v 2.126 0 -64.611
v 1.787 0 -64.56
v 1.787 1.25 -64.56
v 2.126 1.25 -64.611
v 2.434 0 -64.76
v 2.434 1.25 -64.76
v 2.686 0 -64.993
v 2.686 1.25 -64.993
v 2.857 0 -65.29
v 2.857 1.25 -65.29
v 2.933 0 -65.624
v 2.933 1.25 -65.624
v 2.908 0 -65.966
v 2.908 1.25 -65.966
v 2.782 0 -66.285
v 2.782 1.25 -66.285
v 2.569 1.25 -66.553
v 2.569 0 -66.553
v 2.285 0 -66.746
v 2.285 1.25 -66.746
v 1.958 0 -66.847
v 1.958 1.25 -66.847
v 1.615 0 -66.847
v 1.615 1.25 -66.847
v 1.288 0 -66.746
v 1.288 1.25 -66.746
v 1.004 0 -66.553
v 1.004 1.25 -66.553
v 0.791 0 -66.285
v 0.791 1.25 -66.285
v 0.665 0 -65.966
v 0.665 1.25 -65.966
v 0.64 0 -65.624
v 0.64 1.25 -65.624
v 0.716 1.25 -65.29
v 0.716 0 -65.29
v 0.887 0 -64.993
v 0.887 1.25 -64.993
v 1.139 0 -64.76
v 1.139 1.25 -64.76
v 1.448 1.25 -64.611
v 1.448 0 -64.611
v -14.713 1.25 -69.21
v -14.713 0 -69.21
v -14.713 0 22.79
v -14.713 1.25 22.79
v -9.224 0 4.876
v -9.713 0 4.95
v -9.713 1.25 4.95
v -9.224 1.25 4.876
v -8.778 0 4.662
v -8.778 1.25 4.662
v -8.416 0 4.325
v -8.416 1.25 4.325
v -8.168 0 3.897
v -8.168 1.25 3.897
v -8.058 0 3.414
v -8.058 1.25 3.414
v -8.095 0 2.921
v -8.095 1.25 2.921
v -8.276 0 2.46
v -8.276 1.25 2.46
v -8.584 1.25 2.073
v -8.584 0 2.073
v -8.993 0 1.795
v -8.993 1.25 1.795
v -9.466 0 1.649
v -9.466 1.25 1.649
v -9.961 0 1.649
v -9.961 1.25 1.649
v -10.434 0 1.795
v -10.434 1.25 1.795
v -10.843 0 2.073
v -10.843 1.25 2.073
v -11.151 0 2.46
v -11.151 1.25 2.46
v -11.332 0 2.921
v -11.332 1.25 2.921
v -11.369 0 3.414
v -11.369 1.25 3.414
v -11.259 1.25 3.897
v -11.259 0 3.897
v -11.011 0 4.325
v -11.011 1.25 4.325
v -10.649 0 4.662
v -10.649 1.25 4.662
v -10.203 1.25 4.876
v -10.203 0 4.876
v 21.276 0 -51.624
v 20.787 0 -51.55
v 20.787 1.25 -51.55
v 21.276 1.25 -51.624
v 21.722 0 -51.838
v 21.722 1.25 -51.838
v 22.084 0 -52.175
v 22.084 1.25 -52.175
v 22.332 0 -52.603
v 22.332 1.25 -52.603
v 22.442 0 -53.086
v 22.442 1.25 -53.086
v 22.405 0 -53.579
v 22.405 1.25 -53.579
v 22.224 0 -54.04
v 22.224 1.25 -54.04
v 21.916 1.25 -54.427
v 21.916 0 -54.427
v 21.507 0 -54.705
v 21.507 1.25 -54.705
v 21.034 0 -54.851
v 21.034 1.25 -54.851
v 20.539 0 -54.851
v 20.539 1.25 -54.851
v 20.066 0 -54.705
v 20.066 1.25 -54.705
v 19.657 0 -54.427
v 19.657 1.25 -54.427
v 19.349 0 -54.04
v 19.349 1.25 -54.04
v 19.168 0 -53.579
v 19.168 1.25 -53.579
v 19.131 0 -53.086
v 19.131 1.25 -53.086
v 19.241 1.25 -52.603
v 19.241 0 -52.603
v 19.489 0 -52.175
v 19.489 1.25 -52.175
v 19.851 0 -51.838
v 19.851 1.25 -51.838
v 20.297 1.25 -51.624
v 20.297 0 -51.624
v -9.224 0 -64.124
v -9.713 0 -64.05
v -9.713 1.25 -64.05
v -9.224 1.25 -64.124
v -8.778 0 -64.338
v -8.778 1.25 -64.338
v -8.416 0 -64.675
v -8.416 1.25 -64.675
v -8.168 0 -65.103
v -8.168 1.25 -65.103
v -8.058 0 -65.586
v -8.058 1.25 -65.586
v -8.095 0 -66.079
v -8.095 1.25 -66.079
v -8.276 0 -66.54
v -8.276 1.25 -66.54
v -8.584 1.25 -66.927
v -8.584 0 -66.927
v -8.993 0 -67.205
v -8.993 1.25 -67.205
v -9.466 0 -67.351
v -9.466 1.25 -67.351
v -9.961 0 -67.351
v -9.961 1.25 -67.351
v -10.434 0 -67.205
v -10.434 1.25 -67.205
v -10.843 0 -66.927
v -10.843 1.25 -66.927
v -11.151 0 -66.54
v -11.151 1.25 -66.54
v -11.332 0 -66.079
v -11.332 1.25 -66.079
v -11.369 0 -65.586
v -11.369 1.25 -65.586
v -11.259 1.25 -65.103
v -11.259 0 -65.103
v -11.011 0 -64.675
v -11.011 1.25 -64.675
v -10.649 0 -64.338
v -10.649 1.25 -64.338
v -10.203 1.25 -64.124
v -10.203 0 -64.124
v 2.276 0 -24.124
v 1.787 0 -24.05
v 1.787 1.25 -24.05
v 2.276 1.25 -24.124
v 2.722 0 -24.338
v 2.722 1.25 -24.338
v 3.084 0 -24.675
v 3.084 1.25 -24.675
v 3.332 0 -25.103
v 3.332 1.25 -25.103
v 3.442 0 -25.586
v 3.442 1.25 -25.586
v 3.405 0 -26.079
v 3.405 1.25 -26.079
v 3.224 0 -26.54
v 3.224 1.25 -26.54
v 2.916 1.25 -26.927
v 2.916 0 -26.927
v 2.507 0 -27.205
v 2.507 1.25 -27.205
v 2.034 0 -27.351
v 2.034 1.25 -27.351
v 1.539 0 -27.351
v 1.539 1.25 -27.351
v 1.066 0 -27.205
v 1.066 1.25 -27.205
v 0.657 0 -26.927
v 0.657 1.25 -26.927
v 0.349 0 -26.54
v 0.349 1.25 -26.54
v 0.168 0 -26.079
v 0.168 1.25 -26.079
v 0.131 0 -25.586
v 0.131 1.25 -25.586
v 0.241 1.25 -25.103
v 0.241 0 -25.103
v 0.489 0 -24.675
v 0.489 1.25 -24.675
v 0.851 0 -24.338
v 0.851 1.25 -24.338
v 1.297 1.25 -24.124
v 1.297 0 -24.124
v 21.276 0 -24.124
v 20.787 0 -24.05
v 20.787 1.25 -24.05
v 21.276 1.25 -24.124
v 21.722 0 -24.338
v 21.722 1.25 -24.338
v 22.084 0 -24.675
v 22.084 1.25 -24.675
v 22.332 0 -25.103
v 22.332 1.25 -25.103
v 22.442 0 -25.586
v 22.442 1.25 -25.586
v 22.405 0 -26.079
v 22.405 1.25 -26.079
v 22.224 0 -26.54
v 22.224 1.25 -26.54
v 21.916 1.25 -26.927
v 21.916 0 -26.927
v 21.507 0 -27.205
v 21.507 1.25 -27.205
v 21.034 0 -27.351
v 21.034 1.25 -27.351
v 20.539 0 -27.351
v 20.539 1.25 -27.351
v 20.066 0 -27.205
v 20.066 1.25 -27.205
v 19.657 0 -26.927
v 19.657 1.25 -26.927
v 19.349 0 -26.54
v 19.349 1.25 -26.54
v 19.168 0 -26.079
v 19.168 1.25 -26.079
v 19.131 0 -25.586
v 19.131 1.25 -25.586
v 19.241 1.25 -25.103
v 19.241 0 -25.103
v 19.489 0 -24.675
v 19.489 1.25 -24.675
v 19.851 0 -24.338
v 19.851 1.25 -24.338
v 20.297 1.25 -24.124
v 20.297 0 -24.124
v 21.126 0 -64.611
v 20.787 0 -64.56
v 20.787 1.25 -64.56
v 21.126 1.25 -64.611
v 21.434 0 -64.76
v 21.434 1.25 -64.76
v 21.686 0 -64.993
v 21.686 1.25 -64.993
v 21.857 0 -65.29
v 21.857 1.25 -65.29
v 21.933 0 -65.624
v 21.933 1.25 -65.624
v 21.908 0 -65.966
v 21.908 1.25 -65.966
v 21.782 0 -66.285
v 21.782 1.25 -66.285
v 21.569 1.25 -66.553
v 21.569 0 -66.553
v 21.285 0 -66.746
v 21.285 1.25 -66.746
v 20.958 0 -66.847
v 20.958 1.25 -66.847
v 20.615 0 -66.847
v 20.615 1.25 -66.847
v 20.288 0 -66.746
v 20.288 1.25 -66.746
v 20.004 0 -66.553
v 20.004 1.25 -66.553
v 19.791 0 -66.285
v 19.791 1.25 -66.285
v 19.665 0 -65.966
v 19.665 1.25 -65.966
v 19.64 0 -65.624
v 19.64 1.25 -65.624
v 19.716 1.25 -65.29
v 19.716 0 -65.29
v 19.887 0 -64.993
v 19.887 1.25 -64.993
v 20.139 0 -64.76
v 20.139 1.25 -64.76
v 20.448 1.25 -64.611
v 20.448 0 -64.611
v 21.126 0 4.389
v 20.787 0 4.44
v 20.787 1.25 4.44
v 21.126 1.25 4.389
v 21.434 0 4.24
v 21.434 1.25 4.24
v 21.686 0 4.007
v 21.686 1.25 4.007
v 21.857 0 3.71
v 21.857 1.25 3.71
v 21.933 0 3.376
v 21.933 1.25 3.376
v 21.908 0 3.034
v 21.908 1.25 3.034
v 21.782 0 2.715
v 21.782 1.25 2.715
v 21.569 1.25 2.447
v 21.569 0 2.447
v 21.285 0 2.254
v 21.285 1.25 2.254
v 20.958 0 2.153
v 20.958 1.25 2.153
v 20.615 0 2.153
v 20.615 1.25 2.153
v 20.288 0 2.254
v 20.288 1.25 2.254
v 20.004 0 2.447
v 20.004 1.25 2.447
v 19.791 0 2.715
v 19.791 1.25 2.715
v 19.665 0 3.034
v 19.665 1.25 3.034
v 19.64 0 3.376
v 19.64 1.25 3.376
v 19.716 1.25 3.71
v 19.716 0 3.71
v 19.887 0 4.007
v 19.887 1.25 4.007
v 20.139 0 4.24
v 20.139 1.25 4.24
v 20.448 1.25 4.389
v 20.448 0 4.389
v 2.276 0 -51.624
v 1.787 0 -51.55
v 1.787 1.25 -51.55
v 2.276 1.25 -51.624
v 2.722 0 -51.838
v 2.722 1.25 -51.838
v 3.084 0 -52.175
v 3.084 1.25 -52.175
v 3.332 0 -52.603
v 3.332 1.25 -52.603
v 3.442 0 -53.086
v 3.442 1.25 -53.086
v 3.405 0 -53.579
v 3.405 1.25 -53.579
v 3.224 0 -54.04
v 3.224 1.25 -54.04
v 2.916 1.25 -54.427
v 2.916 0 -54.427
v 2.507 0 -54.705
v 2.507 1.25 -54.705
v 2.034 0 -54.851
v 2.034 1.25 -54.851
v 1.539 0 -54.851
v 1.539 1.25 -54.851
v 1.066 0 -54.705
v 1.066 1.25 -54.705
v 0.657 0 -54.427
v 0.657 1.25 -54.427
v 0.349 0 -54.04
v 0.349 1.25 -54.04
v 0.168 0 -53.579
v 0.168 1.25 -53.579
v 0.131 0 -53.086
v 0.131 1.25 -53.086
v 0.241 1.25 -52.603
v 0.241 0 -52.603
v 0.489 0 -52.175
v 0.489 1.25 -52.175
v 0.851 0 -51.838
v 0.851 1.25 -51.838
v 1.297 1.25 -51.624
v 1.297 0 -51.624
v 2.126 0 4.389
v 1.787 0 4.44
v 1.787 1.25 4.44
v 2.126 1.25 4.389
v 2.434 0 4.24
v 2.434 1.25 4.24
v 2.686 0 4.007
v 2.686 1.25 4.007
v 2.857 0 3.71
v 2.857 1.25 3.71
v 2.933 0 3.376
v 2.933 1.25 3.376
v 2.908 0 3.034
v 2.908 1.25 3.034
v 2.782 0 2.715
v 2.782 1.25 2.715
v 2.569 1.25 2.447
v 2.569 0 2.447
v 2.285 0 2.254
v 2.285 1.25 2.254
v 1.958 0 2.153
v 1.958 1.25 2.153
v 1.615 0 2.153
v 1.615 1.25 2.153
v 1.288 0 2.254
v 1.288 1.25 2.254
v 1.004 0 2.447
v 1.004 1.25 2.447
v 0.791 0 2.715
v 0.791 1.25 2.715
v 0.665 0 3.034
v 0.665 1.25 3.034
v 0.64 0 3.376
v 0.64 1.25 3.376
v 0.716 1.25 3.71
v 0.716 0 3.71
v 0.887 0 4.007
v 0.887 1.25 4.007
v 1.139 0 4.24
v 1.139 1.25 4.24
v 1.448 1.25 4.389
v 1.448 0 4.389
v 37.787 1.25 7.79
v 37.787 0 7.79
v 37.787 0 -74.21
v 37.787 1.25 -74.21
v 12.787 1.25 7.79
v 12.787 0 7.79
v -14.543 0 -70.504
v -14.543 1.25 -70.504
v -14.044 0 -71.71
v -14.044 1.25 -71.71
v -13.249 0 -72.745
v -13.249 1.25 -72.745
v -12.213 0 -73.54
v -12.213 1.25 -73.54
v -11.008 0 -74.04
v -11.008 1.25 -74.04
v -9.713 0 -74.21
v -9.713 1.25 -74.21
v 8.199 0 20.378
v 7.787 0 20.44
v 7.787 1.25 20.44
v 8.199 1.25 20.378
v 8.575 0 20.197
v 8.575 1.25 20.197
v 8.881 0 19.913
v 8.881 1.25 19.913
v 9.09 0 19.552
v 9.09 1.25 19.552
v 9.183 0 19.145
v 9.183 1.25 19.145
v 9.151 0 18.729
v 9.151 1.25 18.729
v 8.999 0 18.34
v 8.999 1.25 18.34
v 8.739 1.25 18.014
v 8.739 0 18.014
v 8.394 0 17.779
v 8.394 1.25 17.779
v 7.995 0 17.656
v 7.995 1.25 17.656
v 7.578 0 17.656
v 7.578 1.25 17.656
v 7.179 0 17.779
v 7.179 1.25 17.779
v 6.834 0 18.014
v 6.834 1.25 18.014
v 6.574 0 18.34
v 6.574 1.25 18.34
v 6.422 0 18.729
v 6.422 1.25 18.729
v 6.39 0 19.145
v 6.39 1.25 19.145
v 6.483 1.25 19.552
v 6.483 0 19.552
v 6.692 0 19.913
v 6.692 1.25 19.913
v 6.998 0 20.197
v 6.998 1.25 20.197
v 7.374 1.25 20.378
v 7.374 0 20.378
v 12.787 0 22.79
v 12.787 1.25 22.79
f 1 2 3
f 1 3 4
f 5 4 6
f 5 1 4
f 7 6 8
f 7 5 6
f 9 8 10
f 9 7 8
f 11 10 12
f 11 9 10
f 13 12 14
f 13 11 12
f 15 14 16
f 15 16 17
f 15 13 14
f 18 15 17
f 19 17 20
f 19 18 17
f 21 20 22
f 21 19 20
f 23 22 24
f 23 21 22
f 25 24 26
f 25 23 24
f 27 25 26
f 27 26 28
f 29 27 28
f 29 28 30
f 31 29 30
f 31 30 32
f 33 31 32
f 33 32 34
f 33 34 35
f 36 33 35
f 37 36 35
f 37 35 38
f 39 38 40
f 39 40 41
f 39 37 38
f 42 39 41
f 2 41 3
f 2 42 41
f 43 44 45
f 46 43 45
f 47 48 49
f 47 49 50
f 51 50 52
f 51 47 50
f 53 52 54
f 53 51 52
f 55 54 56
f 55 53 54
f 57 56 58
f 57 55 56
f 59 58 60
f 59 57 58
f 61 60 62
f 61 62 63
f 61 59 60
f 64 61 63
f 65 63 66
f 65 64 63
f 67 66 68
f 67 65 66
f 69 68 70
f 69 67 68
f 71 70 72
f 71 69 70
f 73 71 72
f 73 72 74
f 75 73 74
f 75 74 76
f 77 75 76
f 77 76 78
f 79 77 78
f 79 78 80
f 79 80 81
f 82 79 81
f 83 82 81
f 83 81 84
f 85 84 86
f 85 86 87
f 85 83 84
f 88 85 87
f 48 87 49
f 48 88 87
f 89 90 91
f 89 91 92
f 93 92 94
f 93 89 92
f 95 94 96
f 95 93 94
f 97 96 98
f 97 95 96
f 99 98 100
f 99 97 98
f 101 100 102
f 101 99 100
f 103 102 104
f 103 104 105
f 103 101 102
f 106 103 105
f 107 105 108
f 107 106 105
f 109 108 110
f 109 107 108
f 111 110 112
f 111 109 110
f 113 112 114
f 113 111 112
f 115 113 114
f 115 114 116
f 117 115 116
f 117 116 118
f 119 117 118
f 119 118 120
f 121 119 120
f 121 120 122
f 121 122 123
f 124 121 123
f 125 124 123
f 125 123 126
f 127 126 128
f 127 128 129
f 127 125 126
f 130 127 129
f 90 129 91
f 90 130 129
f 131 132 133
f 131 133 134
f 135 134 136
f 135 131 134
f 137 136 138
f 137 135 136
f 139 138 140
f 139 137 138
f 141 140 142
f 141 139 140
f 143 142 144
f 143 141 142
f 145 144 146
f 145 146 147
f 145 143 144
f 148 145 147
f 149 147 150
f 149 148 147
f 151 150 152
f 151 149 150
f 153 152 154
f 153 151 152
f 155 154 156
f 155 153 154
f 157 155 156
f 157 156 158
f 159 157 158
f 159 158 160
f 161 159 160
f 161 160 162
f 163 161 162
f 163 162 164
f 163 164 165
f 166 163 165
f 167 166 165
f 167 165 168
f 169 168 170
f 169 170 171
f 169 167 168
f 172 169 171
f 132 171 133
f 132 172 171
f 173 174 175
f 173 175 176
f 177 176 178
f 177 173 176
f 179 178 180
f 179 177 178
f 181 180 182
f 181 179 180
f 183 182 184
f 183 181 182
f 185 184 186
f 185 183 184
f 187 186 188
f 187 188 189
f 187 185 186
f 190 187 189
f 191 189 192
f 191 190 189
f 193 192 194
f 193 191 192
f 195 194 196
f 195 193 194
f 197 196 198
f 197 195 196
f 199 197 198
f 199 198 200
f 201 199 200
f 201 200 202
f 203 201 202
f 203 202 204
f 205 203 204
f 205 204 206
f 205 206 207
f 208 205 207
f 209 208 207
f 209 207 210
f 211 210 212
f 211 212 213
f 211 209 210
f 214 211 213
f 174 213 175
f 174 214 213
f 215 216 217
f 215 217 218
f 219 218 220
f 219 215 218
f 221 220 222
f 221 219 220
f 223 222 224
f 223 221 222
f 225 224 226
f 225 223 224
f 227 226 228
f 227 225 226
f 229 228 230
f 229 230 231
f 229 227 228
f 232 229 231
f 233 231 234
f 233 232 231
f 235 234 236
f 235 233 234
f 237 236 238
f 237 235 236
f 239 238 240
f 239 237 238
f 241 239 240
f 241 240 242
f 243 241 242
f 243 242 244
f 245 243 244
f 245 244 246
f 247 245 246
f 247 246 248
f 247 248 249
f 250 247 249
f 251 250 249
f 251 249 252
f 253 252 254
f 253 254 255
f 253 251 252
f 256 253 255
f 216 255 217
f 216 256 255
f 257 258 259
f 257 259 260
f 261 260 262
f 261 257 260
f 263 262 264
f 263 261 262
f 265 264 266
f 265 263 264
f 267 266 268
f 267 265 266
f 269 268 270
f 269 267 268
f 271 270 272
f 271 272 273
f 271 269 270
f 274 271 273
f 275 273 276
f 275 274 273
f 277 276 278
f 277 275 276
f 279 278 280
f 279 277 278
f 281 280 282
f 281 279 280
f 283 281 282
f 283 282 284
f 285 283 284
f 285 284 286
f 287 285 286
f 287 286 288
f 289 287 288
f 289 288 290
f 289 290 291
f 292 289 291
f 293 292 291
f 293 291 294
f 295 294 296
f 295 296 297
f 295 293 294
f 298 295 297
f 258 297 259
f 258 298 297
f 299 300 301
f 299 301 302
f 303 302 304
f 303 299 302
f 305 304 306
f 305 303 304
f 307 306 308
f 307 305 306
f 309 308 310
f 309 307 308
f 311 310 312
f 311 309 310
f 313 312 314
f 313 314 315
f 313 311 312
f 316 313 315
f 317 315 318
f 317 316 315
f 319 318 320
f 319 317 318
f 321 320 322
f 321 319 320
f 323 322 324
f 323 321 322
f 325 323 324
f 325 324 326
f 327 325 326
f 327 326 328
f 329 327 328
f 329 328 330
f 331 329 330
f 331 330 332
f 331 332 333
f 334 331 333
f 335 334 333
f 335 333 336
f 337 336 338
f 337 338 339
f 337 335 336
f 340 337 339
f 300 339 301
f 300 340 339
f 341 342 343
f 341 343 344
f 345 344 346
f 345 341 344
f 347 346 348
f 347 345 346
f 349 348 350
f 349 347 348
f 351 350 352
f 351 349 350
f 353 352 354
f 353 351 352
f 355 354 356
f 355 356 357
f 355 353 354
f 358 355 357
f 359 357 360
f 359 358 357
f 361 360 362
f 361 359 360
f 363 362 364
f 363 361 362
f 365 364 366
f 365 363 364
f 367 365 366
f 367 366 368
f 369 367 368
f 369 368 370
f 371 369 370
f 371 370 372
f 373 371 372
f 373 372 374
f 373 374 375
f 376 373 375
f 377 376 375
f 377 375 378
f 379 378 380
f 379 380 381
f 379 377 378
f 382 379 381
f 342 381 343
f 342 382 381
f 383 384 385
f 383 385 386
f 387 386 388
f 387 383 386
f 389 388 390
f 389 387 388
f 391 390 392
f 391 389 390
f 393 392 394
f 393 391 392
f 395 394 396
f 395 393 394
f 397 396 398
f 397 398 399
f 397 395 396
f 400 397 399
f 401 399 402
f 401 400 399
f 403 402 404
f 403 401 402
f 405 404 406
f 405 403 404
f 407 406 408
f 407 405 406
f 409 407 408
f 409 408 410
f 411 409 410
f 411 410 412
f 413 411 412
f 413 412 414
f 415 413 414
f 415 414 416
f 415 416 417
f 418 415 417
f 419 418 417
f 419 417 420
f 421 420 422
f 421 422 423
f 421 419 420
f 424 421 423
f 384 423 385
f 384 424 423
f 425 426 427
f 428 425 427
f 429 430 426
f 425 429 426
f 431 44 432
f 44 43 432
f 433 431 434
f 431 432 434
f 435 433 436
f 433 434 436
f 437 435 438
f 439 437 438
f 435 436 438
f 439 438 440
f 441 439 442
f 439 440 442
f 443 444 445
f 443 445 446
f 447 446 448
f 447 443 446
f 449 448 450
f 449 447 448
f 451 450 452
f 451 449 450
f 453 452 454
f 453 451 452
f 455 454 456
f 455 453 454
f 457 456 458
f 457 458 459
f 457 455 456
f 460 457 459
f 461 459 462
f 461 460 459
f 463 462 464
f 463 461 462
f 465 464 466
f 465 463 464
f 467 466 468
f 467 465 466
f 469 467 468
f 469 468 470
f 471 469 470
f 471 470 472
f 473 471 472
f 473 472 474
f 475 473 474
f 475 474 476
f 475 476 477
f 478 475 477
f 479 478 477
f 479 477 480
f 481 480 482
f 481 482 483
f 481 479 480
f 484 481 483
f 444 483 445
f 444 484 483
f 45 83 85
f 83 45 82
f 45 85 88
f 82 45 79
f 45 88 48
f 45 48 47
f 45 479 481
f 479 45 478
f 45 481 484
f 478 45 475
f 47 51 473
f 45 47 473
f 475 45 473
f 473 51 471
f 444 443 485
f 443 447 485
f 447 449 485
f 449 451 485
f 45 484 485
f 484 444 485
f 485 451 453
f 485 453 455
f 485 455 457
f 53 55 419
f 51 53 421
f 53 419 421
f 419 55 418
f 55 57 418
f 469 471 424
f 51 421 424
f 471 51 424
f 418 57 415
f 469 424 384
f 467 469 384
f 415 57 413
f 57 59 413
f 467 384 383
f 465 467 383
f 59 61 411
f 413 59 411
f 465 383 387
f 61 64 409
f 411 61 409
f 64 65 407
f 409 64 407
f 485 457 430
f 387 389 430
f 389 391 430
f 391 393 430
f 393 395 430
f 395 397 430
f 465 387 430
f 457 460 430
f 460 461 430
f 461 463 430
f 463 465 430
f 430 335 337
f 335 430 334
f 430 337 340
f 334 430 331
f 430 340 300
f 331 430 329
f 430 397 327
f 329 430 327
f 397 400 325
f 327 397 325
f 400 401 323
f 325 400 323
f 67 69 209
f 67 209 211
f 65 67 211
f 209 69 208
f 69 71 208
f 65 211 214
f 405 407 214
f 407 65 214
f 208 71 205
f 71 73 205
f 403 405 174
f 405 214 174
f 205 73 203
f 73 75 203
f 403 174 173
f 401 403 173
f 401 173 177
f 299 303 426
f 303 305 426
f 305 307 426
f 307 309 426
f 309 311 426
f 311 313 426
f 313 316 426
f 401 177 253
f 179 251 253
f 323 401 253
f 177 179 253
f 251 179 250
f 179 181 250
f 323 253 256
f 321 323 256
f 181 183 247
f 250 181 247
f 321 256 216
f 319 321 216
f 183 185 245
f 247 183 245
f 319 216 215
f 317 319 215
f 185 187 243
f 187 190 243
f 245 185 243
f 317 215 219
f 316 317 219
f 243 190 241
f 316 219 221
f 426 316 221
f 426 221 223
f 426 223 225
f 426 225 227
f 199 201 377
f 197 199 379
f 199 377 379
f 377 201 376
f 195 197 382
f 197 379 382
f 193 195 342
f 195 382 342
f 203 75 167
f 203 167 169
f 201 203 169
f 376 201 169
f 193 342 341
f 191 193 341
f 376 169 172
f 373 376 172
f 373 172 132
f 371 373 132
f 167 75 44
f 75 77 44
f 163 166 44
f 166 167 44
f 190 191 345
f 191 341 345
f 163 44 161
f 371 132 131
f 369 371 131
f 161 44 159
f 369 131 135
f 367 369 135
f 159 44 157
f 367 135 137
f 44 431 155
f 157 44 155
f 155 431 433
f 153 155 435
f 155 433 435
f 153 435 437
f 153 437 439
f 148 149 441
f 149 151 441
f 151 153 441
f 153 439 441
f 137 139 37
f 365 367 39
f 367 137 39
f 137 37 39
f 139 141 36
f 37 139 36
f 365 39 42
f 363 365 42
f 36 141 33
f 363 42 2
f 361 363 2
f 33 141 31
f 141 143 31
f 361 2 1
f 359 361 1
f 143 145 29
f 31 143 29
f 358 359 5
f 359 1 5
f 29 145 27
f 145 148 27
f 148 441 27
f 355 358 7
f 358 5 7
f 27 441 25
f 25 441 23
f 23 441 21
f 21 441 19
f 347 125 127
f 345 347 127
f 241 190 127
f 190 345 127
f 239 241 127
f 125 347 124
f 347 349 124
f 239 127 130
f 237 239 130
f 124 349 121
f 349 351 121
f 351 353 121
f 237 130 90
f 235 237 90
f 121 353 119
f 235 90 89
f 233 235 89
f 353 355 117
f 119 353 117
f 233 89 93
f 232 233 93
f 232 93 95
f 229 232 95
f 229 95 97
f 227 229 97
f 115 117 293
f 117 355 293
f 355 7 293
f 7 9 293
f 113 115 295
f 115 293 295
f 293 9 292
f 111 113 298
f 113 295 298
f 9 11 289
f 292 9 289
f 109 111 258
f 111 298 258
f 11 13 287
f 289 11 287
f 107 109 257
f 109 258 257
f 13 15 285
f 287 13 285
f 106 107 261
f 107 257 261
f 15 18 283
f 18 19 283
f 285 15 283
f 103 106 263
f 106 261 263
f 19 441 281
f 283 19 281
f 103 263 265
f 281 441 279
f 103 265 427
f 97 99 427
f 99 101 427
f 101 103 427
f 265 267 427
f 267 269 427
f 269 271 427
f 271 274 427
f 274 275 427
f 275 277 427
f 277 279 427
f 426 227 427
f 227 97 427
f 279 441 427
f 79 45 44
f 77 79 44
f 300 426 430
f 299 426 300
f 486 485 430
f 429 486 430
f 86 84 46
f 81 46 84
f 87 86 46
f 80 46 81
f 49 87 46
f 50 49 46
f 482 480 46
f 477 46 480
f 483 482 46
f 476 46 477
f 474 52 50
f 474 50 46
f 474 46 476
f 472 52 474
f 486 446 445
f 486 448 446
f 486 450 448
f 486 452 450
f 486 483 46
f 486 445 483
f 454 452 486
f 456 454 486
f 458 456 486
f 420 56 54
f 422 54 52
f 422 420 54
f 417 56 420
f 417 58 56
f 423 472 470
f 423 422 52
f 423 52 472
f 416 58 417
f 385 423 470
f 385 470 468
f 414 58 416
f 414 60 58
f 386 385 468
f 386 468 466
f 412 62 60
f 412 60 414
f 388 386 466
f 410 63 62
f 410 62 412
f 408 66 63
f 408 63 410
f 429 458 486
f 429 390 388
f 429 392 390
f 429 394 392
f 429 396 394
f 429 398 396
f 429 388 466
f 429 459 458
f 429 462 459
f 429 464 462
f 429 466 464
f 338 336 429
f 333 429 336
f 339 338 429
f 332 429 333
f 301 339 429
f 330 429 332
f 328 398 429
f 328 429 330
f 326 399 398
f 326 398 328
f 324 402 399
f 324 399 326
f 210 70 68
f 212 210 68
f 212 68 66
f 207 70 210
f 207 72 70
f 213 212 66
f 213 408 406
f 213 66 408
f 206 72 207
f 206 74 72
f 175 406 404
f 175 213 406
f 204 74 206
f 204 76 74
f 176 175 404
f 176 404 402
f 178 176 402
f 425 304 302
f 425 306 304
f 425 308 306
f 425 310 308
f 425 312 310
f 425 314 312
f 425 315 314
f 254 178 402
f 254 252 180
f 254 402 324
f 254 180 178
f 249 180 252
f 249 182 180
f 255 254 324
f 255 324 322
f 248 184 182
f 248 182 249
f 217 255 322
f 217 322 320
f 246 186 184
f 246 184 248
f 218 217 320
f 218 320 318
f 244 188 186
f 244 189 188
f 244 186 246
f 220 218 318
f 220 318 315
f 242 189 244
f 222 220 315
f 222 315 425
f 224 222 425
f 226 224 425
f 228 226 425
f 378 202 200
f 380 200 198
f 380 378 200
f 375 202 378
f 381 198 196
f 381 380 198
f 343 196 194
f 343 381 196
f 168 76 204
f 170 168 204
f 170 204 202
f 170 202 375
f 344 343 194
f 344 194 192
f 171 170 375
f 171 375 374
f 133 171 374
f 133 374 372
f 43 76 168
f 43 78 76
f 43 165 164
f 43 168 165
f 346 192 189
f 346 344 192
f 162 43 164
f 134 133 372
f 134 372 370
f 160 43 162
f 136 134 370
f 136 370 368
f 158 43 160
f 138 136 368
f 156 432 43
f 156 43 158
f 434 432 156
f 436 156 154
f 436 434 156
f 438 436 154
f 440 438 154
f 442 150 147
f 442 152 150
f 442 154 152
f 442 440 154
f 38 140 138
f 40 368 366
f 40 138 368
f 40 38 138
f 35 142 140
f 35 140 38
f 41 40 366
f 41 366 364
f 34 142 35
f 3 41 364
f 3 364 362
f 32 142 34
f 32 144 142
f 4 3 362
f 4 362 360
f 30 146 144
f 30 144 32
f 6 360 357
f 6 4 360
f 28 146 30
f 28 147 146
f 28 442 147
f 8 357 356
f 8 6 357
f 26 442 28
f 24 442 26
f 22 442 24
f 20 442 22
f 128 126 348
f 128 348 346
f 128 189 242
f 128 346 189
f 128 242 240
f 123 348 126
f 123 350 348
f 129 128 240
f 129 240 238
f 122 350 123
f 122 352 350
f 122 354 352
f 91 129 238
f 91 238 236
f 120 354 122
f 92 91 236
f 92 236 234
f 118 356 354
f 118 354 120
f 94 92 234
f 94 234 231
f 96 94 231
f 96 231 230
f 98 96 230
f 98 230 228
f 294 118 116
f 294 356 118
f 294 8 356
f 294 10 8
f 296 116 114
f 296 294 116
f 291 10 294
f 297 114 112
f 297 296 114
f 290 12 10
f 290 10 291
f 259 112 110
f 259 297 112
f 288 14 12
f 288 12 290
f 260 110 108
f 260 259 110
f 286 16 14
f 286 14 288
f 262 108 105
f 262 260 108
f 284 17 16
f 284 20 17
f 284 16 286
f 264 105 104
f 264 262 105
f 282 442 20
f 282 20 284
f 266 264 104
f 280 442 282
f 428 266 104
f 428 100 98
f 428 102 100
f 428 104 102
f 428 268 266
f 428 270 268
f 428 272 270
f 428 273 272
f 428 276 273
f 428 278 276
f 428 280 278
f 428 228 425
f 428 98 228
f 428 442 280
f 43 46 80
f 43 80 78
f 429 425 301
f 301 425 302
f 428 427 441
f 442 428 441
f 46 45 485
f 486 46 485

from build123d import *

# Parameters (mm, degrees)
SKETCH1_R           = 1.66
SKETCH1_R_2         = 1.15
SKETCH1_R_3         = 1.4
BOSS_EXTRUDE1_DEPTH = 1.25
FILLET1_R           = 5


with BuildPart() as part:
    # Sketch1 → Boss-Extrude1 (new body)
    with BuildSketch(Plane(origin=(0, 0, 0), x_dir=(1, 0, 0), z_dir=(0, 1, 0))):
        Polygon((-14.713467049, 74.209885387), (-14.713467049, -22.790114613), (12.786532951, -22.790114613), (12.786532951, -7.790114613), (37.786532951, -7.790114613), (37.786532951, 74.209885387), align=None)
        with Locations(Location((-9.713467049, 65.709885387, 0), (0, 0, 270))):  # turned: the seam where the file's is
            Circle(SKETCH1_R, mode=Mode.SUBTRACT)
        with Locations(Location((1.786532951, 65.709885387, 0), (0, 0, 270))):  # turned: the seam where the file's is
            Circle(SKETCH1_R_2, mode=Mode.SUBTRACT)
        with Locations(Location((20.786532951, 65.709885387, 0), (0, 0, 270))):  # turned: the seam where the file's is
            Circle(SKETCH1_R_2, mode=Mode.SUBTRACT)
        with Locations(Location((1.786532951, 53.209885387, 0), (0, 0, 270))):  # turned: the seam where the file's is
            Circle(SKETCH1_R, mode=Mode.SUBTRACT)
        with Locations(Location((1.786532951, 25.709885387, 0), (0, 0, 270))):  # turned: the seam where the file's is
            Circle(SKETCH1_R, mode=Mode.SUBTRACT)
        with Locations(Location((20.786532951, 53.209885387, 0), (0, 0, 270))):  # turned: the seam where the file's is
            Circle(SKETCH1_R, mode=Mode.SUBTRACT)
        with Locations(Location((20.786532951, 25.709885387, 0), (0, 0, 270))):  # turned: the seam where the file's is
            Circle(SKETCH1_R, mode=Mode.SUBTRACT)
        with Locations(Location((1.786532951, -3.290114613, 0), (0, 0, 270))):  # turned: the seam where the file's is
            Circle(SKETCH1_R_2, mode=Mode.SUBTRACT)
        with Locations(Location((20.786532951, -3.290114613, 0), (0, 0, 270))):  # turned: the seam where the file's is
            Circle(SKETCH1_R_2, mode=Mode.SUBTRACT)
        with Locations(Location((-9.713467049, -3.290114613, 0), (0, 0, 270))):  # turned: the seam where the file's is
            Circle(SKETCH1_R, mode=Mode.SUBTRACT)
        with Locations(Location((7.786532951, -19.040114613, 0), (0, 0, 270))):  # turned: the seam where the file's is
            Circle(SKETCH1_R_3, mode=Mode.SUBTRACT)
    extrude(amount=BOSS_EXTRUDE1_DEPTH)

    # Fillet1
    fillet1_edges = [part.edges().sort_by_distance(p)[0] for p in [
        (-14.713467049, 0.625, -74.209885387),
    ]]
    fillet(fillet1_edges, radius=FILLET1_R)


solid = part.part
